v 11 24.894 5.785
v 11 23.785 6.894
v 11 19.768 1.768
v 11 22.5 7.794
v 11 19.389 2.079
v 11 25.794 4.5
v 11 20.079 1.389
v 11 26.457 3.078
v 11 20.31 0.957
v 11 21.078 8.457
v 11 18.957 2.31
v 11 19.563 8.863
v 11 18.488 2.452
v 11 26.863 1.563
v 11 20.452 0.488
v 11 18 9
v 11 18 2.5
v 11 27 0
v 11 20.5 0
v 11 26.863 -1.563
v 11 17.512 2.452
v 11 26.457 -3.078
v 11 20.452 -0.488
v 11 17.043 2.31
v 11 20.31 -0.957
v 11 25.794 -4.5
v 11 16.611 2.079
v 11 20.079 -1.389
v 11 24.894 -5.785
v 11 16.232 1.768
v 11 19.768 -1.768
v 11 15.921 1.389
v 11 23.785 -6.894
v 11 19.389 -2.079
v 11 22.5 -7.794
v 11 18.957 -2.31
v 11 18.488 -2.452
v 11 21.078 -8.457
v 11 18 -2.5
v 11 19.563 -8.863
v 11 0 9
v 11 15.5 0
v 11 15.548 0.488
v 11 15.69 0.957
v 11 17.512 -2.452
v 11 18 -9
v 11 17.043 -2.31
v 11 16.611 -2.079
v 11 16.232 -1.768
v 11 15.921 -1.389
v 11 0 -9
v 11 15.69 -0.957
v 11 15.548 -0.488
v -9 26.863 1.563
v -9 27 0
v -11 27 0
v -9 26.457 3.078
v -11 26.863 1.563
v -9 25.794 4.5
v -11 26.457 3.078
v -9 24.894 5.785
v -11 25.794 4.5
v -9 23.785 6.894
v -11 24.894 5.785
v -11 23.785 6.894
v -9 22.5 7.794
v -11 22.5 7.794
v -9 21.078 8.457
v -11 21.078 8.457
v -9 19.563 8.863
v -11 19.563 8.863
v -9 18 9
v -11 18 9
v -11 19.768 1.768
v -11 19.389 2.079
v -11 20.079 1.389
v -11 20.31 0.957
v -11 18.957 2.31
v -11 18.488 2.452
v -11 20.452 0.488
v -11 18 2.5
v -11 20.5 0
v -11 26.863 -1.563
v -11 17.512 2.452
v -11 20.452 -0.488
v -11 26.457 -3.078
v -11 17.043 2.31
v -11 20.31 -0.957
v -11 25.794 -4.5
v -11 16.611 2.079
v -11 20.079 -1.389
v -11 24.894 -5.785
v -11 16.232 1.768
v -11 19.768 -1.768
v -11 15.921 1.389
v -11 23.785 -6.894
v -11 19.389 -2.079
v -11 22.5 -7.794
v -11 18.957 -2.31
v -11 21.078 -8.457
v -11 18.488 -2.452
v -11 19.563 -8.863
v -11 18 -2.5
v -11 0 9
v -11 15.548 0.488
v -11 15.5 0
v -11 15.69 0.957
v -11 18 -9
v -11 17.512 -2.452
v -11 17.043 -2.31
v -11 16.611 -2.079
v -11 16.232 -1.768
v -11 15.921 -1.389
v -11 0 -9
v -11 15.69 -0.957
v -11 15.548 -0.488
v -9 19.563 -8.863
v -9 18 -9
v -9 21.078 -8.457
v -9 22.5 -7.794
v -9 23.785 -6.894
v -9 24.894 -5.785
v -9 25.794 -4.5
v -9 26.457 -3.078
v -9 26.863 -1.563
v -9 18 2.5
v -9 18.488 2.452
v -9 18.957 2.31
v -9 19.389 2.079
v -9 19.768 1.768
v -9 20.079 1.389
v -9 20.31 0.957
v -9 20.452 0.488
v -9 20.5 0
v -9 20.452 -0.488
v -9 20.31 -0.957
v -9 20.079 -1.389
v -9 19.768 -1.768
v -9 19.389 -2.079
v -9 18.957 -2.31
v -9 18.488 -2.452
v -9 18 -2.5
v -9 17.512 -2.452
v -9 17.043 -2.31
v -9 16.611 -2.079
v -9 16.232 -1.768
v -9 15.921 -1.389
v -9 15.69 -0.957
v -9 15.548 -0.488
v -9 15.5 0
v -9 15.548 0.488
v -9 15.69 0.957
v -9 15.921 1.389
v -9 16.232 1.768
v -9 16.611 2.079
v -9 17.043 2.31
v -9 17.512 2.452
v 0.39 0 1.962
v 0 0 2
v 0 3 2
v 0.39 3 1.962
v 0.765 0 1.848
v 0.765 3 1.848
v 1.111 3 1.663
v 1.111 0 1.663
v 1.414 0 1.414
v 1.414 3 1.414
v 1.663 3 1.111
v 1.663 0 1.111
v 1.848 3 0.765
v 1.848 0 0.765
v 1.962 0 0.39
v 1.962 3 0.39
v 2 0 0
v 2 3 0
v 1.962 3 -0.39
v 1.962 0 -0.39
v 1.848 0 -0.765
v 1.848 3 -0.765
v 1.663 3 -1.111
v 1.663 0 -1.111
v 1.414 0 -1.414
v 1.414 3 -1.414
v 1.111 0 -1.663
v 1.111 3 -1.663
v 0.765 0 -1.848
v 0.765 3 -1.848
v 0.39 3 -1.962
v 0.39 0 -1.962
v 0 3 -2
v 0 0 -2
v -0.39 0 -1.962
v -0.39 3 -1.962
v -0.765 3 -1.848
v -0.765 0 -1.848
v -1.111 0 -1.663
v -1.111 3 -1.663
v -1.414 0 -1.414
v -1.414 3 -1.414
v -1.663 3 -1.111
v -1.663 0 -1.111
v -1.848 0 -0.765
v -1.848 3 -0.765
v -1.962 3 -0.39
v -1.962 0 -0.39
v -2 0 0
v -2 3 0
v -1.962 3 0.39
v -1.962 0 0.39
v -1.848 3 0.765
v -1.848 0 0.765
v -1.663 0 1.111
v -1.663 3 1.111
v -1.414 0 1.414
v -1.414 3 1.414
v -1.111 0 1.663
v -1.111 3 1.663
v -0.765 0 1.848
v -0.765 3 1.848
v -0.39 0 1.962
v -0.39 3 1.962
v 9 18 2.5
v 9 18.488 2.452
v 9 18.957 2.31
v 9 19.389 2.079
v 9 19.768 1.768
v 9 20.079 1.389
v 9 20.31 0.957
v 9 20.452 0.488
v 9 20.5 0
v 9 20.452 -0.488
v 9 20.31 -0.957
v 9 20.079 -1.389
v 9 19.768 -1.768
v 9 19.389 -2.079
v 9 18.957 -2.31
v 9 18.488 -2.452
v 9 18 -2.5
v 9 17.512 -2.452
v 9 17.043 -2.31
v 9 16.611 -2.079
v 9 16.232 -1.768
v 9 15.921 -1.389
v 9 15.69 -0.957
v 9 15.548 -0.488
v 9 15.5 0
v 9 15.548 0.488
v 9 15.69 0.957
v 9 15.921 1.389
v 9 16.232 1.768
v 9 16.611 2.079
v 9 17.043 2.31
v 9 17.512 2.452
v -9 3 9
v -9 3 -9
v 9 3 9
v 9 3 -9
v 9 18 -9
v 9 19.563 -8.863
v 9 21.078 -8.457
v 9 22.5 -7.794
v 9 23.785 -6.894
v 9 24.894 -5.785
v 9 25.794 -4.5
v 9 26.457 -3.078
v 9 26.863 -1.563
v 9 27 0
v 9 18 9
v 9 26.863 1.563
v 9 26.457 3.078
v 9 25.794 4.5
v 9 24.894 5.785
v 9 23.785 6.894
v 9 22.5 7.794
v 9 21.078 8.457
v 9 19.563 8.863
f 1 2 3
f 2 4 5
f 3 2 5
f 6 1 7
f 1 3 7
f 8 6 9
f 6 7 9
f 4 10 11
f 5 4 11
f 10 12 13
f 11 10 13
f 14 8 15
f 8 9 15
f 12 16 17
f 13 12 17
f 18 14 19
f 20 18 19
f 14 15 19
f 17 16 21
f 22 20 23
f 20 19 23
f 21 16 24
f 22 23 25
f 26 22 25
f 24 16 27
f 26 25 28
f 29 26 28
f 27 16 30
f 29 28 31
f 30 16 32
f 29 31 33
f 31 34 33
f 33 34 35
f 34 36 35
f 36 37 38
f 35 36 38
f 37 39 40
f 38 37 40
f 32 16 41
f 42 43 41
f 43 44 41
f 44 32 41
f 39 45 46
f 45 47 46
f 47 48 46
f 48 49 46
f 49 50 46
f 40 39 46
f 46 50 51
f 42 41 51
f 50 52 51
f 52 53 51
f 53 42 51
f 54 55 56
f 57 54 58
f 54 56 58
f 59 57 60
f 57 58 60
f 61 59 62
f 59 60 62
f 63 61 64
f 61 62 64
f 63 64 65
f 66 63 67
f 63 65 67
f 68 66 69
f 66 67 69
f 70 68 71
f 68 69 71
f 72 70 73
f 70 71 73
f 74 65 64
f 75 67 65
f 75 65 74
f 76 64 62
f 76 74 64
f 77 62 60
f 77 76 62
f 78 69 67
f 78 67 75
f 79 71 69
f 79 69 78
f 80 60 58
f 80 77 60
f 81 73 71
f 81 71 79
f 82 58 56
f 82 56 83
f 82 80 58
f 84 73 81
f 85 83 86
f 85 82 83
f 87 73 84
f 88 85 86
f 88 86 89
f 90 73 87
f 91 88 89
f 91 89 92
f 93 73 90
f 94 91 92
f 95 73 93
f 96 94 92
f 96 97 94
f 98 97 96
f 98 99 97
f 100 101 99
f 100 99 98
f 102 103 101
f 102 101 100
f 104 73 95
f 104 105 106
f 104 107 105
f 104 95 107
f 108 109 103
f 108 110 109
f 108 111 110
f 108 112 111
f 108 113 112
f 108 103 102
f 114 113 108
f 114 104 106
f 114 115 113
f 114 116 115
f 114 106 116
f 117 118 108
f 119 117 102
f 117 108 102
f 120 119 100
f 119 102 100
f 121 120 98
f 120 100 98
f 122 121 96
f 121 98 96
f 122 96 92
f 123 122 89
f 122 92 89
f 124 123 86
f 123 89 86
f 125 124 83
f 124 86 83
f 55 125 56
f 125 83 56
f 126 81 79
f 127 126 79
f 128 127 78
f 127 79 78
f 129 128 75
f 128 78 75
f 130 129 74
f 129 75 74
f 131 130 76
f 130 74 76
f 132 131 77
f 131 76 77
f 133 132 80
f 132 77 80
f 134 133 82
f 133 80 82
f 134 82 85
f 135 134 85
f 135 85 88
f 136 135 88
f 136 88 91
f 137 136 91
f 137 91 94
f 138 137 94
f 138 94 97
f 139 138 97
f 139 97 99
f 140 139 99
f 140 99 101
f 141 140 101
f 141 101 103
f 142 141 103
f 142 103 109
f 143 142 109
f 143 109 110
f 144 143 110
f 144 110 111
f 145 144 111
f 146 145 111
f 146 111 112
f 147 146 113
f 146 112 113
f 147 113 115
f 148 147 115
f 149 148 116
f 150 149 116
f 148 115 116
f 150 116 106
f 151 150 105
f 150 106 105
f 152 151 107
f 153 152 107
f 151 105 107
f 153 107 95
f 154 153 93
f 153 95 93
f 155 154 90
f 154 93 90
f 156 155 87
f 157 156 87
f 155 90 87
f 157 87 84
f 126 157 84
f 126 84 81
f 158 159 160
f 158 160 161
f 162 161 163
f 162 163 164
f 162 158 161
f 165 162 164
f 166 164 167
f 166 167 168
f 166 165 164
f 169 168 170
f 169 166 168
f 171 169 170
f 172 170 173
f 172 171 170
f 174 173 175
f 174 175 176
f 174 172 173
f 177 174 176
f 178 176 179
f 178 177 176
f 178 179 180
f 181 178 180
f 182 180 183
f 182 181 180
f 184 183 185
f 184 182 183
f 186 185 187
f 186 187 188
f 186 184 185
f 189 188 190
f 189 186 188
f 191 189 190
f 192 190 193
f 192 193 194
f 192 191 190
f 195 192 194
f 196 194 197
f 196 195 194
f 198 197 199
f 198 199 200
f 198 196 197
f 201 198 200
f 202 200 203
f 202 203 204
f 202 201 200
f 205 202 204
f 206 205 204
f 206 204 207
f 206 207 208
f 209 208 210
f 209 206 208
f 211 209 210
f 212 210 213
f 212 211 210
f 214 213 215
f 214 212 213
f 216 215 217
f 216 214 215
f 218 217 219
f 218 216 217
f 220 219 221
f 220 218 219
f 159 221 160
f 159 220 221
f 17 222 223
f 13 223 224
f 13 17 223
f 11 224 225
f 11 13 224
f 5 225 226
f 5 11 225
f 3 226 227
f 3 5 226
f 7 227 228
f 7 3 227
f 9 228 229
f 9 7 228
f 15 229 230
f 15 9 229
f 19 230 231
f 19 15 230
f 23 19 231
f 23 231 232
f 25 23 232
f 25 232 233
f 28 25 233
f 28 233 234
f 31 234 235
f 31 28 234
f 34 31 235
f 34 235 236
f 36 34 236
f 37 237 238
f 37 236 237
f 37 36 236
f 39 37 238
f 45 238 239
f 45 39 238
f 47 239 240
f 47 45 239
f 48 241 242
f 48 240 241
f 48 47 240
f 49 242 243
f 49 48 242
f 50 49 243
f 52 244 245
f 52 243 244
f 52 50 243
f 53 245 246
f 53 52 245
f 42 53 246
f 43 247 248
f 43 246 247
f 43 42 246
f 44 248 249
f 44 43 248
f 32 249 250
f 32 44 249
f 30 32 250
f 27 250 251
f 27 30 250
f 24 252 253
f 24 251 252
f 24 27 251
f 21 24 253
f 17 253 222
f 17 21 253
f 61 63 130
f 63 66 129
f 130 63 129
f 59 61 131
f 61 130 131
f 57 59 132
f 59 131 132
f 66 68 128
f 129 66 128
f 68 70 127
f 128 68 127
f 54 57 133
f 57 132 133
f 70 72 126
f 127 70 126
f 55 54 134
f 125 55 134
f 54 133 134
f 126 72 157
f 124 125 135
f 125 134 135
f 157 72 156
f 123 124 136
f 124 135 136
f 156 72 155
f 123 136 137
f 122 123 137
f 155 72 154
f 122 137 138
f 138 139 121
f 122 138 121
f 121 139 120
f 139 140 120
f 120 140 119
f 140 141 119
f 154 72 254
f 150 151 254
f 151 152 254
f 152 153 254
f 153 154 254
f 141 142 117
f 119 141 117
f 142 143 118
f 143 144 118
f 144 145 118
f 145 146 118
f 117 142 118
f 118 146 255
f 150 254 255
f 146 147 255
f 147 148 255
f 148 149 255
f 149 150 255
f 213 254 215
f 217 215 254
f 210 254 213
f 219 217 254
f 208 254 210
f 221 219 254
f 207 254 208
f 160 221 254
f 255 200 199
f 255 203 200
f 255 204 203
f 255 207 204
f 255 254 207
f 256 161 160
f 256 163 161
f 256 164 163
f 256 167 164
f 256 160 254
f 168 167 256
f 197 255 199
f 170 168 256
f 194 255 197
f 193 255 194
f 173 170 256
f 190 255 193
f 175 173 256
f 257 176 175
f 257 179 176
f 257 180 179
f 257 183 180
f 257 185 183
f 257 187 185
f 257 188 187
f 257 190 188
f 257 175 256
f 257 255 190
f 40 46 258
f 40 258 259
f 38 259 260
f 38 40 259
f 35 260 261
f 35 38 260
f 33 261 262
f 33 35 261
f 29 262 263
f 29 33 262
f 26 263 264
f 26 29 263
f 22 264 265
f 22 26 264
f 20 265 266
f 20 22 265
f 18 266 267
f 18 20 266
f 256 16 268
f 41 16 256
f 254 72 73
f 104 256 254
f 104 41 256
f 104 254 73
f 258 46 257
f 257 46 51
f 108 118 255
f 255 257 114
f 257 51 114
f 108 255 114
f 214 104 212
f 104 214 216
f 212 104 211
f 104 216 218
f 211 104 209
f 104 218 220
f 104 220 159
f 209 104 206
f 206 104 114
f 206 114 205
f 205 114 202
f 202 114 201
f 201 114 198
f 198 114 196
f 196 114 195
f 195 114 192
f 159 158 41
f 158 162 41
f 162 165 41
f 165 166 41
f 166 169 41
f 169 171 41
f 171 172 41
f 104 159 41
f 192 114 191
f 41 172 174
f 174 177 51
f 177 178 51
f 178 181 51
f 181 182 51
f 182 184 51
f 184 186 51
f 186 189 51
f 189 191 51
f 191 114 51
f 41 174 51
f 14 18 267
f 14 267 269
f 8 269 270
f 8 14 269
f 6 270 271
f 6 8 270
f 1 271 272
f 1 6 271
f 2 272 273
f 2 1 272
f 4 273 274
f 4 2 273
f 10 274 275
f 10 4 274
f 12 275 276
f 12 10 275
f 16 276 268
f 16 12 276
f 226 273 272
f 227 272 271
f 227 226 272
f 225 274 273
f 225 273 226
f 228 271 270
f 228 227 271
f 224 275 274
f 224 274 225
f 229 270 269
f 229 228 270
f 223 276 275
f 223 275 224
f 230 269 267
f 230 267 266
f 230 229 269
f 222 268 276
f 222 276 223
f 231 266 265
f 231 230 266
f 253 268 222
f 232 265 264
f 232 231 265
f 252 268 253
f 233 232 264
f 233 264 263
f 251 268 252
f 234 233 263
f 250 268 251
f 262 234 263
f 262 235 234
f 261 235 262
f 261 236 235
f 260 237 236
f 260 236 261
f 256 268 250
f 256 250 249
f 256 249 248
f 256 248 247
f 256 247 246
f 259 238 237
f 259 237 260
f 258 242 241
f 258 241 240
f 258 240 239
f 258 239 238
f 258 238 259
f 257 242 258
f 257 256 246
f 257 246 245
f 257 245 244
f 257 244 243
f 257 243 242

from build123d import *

# Parameters (mm, degrees)
SKETCH1_W           = 22
SKETCH1_H           = 18
SKETCH1_R           = 2
BOSS_EXTRUDE2_DEPTH = 3
SKETCH2_W           = 2
SKETCH2_H           = 18
BOSS_EXTRUDE3_DEPTH = 24
SKETCH3_R           = 2.5
CUT_EXTRUDE1_DEPTH  = 24


with BuildPart() as part:
    # Sketch1 → Boss-Extrude2 (new body)
    with BuildSketch(Plane(origin=(0, 0, 0), x_dir=(1, 0, 0), z_dir=(0, 1, 0))):
        Rectangle(SKETCH1_W, SKETCH1_H)
        with Locations(Location((0, 0, 0), (0, 0, 270))):
            Circle(SKETCH1_R, mode=Mode.SUBTRACT)
    boss_extrude2 = extrude(amount=BOSS_EXTRUDE2_DEPTH)

    # Sketch2 → Boss-Extrude3 (add)
    with BuildSketch(Plane(origin=(0, 3, 0), x_dir=(1, 0, 0), z_dir=(0, 1, 0))):
        with Locations((-10, 0)):
            Rectangle(SKETCH2_W, SKETCH2_H)
    boss_extrude3 = extrude(amount=BOSS_EXTRUDE3_DEPTH)

    # Sketch3 → Cut-Extrude1 (cut)
    with BuildSketch(Plane.ZY.offset(11)):
        with BuildLine():
            Line((9, 27), (0, 27))
            ThreePointArc((0, 27), (6.363961031, 24.363961031), (9, 18))
            Line((9, 18), (9, 27))
        make_face()
        with BuildLine():
            Line((-9, 27), (-9, 18))
            ThreePointArc((-9, 18), (-6.363961031, 24.363961031), (0, 27))
            Line((0, 27), (-9, 27))
        make_face()
        with Locations((0, 18)):
            Circle(SKETCH3_R)
    cut_extrude1 = extrude(amount=-CUT_EXTRUDE1_DEPTH, mode=Mode.SUBTRACT)

    # Mirror1: Boss-Extrude2, Boss-Extrude3, Cut-Extrude1 across plane
    add(boss_extrude2.mirror(Plane(origin=(0, 0, 0), x_dir=(0, 0, 1), z_dir=(1, 0, 0))))
    add(boss_extrude3.mirror(Plane(origin=(0, 0, 0), x_dir=(0, 0, 1), z_dir=(1, 0, 0))))
    add(cut_extrude1.mirror(Plane(origin=(0, 0, 0), x_dir=(0, 0, 1), z_dir=(1, 0, 0))), mode=Mode.SUBTRACT)


solid = part.part
